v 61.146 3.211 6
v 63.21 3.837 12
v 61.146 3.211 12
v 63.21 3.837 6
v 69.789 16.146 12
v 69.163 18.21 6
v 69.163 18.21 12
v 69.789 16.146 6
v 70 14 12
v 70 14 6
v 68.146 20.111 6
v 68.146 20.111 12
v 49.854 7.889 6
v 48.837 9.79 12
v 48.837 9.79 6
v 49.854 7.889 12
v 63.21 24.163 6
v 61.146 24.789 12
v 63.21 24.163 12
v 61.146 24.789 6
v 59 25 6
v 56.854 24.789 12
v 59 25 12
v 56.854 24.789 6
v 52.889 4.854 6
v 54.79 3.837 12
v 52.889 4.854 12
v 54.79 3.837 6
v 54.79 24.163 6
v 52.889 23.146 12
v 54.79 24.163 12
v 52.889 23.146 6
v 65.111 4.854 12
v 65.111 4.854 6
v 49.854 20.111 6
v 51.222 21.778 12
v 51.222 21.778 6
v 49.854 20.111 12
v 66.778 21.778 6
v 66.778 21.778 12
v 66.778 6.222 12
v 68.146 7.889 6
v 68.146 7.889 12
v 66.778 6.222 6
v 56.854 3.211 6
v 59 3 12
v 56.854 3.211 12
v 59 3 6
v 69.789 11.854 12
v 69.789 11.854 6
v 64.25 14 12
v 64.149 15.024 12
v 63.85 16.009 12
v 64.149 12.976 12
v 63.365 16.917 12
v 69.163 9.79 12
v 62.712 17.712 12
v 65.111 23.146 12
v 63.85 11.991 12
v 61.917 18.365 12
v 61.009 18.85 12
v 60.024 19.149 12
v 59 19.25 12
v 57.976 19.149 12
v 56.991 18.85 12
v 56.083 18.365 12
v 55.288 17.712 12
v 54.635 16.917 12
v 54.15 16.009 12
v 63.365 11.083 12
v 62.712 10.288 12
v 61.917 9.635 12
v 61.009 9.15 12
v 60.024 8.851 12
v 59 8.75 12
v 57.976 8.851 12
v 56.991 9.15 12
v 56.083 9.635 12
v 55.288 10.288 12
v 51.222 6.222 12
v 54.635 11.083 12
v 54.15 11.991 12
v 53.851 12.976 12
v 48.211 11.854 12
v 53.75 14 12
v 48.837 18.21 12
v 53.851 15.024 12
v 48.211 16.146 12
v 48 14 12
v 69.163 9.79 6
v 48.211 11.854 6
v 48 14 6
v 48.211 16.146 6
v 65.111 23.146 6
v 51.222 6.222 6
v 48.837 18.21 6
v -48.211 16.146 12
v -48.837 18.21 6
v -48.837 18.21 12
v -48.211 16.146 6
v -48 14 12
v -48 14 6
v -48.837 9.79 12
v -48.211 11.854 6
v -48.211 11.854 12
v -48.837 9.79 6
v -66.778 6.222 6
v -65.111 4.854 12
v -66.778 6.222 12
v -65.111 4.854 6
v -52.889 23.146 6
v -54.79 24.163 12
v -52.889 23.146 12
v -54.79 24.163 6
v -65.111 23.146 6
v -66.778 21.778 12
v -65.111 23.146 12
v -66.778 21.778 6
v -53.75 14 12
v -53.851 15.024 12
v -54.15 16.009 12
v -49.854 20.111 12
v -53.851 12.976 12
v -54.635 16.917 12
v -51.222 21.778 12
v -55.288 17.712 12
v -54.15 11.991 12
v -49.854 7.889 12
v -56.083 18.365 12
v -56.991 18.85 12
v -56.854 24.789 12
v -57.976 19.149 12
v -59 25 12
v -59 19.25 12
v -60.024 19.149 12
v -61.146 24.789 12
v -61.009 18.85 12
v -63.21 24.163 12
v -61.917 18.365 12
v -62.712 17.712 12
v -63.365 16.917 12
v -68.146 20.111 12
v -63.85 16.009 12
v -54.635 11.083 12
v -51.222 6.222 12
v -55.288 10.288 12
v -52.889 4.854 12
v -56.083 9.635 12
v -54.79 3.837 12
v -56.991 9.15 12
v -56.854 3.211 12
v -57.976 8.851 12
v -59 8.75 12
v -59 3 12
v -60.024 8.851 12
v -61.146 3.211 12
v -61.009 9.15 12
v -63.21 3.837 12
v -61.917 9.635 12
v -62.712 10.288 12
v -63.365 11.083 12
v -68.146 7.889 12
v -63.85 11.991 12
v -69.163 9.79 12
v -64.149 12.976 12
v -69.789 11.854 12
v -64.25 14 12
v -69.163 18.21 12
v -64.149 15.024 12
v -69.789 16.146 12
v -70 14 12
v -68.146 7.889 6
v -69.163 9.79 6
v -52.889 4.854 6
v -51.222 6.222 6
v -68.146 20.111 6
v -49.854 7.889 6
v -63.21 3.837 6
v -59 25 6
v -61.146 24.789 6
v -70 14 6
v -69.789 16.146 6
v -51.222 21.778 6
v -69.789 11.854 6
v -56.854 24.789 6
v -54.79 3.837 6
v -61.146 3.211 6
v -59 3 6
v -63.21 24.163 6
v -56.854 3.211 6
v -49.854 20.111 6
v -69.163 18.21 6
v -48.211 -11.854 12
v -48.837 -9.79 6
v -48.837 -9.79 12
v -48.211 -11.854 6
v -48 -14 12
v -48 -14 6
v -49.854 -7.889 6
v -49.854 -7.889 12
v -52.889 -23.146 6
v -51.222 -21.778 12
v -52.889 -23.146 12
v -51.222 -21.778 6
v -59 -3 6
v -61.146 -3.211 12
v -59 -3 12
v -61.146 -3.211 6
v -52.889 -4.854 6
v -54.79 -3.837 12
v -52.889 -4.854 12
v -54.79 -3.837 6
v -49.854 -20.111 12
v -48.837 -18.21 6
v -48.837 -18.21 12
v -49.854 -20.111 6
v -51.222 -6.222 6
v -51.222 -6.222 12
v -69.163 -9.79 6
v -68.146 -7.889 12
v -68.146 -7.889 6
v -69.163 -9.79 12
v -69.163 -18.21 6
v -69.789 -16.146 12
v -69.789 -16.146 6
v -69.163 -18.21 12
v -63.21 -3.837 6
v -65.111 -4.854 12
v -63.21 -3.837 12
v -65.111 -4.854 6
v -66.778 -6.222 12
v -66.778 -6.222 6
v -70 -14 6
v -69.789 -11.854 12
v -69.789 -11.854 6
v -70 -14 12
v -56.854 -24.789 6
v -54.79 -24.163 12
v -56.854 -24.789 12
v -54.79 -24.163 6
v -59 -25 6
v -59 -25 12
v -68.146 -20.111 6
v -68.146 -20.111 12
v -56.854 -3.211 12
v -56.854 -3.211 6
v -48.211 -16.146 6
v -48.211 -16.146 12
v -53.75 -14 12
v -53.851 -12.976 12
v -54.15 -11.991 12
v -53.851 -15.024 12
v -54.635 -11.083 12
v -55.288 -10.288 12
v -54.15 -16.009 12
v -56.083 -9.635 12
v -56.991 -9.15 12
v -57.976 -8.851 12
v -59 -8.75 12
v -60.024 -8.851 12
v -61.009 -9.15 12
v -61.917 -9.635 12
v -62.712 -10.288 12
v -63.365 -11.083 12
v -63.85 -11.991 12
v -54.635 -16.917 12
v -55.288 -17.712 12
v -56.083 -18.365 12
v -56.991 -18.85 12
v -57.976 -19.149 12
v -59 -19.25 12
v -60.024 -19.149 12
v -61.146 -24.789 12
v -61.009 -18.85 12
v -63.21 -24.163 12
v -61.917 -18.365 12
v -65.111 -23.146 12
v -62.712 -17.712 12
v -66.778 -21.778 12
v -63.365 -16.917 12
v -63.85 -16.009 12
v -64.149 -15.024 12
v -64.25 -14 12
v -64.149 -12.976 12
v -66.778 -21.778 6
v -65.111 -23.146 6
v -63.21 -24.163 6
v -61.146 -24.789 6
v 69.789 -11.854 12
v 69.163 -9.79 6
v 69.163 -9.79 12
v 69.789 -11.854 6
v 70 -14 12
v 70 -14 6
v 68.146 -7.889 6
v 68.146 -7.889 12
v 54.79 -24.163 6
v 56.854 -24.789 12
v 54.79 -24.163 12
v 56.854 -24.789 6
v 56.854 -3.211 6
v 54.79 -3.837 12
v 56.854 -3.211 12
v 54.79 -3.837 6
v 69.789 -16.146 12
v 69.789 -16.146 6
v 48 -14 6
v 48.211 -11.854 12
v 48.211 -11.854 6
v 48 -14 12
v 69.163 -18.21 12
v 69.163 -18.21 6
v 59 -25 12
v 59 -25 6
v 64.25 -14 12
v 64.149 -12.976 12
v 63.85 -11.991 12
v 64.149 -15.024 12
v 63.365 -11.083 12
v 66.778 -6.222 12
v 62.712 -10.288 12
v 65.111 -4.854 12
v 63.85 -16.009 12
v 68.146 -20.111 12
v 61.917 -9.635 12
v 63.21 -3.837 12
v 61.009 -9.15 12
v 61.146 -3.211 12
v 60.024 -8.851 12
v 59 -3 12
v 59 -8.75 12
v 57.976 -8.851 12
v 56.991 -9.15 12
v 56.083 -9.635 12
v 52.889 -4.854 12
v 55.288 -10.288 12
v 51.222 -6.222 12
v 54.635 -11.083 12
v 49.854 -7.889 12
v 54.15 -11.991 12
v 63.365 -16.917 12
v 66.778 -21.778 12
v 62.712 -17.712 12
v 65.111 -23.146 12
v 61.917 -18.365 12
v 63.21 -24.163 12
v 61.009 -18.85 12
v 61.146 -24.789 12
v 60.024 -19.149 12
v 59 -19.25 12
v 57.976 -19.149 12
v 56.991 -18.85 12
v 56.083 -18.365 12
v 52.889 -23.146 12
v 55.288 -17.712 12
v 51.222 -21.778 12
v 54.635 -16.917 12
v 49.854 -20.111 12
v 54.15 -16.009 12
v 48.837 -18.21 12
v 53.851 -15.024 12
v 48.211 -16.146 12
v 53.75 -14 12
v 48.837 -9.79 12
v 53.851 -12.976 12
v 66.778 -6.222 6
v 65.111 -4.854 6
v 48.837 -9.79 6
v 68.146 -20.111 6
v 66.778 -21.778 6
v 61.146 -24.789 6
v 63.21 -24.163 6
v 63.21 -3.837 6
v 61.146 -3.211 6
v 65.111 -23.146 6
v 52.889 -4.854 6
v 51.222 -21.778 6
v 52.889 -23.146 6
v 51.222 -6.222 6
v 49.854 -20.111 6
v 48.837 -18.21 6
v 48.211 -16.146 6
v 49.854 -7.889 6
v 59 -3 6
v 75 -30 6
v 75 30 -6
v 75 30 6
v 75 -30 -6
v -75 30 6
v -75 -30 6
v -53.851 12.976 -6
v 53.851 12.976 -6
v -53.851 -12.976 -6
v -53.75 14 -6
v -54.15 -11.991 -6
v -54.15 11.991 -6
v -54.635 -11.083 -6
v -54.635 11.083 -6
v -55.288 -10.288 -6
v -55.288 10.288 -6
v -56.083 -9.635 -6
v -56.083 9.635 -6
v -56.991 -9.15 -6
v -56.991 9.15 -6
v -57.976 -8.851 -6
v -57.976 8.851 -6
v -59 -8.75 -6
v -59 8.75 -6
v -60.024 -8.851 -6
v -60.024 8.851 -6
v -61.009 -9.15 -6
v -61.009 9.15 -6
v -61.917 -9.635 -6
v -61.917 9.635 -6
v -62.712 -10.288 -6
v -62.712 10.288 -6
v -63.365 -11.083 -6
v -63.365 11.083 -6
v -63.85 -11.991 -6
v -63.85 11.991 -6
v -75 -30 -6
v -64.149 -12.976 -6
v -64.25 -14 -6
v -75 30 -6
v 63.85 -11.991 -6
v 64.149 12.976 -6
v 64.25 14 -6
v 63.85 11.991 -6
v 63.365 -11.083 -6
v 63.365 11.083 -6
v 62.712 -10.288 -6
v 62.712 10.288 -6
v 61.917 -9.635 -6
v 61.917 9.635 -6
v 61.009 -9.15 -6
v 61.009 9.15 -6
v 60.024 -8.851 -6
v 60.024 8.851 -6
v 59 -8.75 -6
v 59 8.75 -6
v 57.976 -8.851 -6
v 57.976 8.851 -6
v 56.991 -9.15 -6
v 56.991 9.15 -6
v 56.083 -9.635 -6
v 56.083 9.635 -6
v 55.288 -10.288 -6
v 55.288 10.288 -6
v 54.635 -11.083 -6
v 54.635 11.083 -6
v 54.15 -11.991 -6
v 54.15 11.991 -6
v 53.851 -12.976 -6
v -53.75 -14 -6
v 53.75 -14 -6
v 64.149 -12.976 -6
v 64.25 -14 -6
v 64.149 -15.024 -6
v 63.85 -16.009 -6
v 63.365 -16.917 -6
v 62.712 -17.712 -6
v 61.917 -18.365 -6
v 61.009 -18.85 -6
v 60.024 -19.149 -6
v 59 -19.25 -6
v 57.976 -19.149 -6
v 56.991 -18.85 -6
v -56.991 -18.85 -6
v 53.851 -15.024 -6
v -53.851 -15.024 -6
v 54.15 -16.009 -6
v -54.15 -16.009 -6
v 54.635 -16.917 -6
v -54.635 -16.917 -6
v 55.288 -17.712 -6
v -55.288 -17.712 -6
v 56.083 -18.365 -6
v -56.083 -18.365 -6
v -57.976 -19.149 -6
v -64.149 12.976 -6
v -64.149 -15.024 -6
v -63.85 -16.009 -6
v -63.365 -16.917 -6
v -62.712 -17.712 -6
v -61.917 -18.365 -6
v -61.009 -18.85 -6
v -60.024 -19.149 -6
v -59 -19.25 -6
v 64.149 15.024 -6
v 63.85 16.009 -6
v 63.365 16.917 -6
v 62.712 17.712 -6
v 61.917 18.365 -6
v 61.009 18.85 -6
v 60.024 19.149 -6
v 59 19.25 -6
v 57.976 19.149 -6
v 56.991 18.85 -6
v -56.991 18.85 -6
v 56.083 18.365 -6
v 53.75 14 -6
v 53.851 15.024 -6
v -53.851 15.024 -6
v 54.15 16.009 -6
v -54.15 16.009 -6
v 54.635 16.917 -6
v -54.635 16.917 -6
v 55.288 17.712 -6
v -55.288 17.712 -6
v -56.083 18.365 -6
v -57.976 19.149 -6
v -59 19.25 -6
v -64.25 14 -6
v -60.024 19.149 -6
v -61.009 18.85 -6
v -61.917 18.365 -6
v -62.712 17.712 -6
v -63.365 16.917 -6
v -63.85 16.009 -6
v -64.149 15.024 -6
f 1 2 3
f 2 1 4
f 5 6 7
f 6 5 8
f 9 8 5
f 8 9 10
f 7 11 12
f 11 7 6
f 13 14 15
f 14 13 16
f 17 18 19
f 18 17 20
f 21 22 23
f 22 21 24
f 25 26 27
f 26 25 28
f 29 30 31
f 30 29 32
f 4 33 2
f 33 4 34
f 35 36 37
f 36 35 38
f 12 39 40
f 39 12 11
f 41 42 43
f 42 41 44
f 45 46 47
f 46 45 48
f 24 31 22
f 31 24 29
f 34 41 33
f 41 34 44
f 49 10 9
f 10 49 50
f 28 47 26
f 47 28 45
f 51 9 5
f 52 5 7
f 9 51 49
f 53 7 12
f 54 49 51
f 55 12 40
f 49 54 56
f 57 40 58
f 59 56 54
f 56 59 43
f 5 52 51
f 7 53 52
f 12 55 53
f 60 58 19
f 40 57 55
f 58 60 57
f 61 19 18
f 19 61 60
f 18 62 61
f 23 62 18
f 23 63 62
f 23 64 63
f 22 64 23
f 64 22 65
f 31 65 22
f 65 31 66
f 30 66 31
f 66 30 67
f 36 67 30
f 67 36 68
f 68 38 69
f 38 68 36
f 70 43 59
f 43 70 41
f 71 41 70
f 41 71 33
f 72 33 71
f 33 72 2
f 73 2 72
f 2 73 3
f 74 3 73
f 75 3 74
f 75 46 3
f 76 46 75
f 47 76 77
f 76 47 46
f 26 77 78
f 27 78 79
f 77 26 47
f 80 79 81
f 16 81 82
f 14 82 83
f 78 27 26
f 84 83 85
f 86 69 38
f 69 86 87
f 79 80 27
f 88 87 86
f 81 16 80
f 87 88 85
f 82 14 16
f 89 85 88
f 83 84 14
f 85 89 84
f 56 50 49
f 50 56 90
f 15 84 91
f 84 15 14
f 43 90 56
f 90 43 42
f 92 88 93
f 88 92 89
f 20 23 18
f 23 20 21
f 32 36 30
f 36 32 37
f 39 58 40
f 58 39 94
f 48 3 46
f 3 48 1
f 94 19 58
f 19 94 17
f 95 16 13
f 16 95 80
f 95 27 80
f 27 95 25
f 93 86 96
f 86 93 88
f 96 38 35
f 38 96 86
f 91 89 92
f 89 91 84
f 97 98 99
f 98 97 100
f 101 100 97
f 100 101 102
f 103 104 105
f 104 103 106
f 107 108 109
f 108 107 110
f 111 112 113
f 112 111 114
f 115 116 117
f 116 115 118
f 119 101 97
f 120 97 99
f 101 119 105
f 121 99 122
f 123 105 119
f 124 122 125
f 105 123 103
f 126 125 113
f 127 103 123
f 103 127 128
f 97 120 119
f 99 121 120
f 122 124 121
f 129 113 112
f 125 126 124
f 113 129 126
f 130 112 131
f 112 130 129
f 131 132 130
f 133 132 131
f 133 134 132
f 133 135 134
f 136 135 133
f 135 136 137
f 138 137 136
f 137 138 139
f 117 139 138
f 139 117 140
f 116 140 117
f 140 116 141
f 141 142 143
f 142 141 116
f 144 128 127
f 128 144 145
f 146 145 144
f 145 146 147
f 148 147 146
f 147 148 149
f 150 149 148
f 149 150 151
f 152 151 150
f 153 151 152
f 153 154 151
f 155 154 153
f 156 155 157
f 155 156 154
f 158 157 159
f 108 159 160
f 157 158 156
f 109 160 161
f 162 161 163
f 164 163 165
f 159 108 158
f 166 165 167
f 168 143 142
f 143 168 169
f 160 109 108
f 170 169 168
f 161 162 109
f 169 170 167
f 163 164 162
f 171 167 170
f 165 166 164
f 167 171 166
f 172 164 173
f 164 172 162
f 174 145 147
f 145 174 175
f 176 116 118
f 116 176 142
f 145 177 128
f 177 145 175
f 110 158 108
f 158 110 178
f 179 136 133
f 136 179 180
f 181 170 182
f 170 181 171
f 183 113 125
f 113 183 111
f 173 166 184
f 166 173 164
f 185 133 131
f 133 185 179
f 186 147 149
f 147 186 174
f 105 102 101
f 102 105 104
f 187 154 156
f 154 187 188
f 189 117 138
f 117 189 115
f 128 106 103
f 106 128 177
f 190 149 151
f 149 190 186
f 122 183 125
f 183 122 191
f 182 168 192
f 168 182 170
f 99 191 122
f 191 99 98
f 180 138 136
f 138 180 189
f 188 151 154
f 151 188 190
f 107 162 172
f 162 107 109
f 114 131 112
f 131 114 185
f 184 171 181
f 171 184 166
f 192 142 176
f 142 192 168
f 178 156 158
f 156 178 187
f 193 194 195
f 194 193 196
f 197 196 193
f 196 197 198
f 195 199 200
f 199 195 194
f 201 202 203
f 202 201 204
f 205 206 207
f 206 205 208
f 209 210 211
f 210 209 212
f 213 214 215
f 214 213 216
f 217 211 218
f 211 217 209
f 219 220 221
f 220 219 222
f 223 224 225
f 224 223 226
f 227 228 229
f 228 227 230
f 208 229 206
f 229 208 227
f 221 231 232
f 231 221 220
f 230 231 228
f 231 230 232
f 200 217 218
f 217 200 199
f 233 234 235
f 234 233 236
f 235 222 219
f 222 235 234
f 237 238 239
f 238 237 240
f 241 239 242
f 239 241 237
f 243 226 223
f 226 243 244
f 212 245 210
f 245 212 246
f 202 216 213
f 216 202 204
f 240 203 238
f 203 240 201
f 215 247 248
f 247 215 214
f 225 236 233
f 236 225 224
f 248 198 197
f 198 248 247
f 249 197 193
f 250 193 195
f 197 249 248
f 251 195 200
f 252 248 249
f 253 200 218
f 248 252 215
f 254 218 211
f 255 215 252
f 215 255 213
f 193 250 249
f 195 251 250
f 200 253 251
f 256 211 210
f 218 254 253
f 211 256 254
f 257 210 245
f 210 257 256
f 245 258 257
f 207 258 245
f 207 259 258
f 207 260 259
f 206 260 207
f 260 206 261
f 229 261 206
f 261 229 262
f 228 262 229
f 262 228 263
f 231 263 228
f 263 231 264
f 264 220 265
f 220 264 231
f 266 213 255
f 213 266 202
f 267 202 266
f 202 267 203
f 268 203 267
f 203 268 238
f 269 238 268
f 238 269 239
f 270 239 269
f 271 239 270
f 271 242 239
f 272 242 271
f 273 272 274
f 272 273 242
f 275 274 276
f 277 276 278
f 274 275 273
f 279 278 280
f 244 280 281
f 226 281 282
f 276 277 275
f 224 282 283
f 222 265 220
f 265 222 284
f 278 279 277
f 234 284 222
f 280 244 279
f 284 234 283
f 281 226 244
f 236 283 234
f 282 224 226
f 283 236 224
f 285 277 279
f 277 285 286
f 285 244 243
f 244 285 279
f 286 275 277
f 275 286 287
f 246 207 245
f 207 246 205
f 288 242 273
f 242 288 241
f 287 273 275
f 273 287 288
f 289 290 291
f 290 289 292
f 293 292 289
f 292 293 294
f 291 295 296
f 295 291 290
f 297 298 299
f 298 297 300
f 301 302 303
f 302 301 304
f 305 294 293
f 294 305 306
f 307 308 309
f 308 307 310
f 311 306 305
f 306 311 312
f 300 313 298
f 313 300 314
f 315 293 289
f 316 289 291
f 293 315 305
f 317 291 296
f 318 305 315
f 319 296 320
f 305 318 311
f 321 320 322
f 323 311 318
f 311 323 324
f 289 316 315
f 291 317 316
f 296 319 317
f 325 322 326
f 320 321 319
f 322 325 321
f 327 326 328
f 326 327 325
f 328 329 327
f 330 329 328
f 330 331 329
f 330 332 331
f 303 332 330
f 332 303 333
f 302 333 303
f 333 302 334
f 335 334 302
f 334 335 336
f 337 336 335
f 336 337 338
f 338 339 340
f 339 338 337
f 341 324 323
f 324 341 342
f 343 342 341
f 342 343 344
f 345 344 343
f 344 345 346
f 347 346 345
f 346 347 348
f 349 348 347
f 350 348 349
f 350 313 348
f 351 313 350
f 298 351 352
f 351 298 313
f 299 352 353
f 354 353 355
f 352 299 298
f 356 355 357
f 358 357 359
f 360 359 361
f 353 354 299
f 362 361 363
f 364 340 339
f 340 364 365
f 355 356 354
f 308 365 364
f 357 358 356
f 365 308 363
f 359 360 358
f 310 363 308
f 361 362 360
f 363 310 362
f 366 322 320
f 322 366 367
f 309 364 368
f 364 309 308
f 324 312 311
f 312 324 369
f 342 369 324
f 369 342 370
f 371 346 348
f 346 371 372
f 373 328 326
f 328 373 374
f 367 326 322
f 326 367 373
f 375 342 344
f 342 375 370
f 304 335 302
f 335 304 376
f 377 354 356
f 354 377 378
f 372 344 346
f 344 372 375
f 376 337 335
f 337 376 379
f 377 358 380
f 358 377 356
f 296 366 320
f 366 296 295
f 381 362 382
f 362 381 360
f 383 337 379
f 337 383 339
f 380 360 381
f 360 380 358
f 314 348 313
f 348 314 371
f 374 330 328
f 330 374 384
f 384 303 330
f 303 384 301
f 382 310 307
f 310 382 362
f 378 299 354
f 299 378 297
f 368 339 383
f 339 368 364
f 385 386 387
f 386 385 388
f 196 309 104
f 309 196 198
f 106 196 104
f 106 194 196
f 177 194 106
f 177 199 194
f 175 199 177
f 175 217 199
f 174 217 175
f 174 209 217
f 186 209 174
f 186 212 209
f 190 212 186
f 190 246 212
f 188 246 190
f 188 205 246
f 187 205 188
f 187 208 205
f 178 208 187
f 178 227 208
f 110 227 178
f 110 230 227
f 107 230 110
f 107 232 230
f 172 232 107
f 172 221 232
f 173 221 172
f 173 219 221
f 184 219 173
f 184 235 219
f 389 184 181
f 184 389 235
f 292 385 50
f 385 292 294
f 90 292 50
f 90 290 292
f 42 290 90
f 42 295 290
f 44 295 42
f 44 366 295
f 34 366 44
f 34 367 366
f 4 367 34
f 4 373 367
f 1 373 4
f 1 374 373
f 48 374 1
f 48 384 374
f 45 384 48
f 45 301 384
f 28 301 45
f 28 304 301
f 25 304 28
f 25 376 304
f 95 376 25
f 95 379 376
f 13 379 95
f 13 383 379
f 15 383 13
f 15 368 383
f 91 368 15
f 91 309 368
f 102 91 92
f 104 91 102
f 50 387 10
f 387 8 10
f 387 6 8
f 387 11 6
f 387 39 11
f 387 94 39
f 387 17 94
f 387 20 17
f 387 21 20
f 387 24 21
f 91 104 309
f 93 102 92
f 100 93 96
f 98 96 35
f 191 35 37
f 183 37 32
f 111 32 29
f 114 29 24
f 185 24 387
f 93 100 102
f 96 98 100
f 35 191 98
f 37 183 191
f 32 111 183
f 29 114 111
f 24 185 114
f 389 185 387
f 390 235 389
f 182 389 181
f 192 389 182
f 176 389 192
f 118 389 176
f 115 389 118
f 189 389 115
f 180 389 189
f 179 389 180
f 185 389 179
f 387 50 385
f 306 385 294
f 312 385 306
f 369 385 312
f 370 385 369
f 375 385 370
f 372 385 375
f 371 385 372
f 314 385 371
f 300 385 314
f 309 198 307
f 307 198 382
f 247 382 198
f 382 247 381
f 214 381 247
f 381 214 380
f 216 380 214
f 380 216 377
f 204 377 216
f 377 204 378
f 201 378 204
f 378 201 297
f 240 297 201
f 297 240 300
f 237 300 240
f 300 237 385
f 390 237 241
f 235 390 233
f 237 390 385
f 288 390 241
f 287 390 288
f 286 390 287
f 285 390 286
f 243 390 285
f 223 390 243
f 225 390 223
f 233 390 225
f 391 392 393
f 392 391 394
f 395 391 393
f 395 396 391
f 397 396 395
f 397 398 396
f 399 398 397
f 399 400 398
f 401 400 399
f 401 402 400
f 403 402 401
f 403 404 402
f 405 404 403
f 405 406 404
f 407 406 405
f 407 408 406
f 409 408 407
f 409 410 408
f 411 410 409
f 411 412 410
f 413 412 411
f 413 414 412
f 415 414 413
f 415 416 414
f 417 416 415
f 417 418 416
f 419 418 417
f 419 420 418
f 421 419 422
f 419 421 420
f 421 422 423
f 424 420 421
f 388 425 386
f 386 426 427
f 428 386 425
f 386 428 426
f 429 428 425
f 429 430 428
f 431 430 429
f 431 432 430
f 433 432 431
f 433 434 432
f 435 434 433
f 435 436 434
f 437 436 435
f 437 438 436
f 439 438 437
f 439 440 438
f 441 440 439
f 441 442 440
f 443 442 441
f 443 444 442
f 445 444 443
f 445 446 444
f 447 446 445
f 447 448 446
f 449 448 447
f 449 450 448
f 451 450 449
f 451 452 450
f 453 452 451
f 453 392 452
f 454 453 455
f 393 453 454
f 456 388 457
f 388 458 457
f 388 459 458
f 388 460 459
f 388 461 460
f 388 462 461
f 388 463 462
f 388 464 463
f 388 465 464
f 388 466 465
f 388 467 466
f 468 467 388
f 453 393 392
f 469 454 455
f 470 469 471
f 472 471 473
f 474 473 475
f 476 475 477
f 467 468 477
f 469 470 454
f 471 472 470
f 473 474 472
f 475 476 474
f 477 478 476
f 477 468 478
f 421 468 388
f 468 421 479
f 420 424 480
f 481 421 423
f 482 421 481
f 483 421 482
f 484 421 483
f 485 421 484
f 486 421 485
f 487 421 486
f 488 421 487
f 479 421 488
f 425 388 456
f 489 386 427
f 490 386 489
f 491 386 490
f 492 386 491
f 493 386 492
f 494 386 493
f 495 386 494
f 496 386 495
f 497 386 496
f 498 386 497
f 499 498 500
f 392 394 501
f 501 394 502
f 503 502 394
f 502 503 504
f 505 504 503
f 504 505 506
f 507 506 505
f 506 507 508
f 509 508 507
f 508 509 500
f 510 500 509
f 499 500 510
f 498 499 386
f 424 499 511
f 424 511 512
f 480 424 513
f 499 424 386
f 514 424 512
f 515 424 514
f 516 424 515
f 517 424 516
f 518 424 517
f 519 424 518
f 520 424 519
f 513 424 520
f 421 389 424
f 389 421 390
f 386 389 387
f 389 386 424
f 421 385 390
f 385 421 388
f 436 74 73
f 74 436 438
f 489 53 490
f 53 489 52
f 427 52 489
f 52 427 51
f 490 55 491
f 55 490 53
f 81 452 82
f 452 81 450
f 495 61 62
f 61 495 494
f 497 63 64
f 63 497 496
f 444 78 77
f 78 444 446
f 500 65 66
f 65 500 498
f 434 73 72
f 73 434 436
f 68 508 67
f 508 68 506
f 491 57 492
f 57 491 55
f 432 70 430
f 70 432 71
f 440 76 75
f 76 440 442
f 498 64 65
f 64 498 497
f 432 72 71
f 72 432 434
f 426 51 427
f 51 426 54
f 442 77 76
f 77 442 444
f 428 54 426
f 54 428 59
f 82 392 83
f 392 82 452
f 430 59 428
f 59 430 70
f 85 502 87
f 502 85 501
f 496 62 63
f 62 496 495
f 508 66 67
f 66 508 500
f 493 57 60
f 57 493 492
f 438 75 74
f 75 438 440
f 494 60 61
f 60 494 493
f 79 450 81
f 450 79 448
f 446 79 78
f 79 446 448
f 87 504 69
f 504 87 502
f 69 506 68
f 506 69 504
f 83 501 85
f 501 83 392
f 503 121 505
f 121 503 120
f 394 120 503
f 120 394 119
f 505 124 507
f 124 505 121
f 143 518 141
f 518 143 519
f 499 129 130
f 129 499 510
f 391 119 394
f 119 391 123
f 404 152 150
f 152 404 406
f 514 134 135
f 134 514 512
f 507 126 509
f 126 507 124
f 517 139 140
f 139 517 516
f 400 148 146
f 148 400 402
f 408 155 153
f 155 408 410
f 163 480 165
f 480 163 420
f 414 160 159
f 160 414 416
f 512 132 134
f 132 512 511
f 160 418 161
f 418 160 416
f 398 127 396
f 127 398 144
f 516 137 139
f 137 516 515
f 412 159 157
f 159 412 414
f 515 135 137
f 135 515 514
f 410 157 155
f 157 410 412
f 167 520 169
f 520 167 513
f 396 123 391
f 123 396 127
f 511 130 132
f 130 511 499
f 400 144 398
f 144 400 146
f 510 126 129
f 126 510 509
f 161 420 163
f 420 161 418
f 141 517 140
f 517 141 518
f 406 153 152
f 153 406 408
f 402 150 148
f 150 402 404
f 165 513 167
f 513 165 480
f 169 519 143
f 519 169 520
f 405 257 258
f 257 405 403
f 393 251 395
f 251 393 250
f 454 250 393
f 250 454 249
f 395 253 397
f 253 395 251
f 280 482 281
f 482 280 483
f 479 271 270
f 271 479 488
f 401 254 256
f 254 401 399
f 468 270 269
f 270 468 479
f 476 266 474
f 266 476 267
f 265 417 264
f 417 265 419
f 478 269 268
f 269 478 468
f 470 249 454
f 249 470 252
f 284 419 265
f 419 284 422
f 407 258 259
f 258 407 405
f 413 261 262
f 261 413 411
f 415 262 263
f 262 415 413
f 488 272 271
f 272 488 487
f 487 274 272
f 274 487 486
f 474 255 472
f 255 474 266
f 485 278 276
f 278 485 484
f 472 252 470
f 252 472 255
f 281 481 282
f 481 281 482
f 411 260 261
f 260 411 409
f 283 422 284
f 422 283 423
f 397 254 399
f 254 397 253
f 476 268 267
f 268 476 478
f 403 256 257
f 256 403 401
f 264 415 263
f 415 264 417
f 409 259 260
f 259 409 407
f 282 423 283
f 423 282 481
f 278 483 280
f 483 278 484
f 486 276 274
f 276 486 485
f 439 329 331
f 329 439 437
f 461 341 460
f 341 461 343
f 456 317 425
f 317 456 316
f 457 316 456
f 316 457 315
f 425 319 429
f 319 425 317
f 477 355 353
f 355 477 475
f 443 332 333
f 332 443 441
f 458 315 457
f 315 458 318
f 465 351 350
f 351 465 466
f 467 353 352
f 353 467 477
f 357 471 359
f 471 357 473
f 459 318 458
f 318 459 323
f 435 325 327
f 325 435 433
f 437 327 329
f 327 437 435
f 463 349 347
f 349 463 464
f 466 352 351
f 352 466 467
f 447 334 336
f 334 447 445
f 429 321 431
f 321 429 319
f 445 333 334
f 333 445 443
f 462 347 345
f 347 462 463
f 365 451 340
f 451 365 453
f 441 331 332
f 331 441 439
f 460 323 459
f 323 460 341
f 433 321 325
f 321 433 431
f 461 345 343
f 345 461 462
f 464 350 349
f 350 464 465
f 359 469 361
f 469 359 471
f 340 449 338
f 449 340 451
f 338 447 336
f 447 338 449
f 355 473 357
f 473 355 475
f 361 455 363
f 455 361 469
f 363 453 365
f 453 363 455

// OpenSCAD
$fn = 32;

// ----------------------------------------------------------------------
// Anchor pads 150 x 60 x 18
// four corner bosses with anchor holes
// ----------------------------------------------------------------------

// --- parameters (mm) ---
plate = [150, 60, 12];  // base plate size (x, y, z)
pads = 4;               // boss count, one per corner
edge = 16;              // boss centre offset from the plate edge
boss_d = 22;            // boss diameter
boss_h = 6;             // boss height above the base plate
hole_d = 10.5;          // hole diameter

// --- derived feature positions (mm) ---
height = plate[2] + boss_h;      // = 18   overall height of the part
corner_x = plate[0] / 2 - edge;  // = 59   boss centre X
corner_y = plate[1] / 2 - edge;  // = 14   boss centre Y
feature_centers = [
  [corner_x, corner_y],
  [-corner_x, corner_y],
  [-corner_x, -corner_y],
  [corner_x, -corner_y]
];   // boss centres, anchor holes are drilled there

// base plate, four bosses standing on it, anchor holes all the way through
difference() {
  union() {
    cube(plate, center = true);
    for (centre = feature_centers)
      translate([centre[0], centre[1], plate[2] / 2 - 1])
        cylinder(d = boss_d, h = boss_h + 1);
  }
  for (centre = feature_centers)
    translate([centre[0], centre[1], -height])
      cylinder(d = hole_d, h = 2 * height + 2);  // through boss and plate
}
